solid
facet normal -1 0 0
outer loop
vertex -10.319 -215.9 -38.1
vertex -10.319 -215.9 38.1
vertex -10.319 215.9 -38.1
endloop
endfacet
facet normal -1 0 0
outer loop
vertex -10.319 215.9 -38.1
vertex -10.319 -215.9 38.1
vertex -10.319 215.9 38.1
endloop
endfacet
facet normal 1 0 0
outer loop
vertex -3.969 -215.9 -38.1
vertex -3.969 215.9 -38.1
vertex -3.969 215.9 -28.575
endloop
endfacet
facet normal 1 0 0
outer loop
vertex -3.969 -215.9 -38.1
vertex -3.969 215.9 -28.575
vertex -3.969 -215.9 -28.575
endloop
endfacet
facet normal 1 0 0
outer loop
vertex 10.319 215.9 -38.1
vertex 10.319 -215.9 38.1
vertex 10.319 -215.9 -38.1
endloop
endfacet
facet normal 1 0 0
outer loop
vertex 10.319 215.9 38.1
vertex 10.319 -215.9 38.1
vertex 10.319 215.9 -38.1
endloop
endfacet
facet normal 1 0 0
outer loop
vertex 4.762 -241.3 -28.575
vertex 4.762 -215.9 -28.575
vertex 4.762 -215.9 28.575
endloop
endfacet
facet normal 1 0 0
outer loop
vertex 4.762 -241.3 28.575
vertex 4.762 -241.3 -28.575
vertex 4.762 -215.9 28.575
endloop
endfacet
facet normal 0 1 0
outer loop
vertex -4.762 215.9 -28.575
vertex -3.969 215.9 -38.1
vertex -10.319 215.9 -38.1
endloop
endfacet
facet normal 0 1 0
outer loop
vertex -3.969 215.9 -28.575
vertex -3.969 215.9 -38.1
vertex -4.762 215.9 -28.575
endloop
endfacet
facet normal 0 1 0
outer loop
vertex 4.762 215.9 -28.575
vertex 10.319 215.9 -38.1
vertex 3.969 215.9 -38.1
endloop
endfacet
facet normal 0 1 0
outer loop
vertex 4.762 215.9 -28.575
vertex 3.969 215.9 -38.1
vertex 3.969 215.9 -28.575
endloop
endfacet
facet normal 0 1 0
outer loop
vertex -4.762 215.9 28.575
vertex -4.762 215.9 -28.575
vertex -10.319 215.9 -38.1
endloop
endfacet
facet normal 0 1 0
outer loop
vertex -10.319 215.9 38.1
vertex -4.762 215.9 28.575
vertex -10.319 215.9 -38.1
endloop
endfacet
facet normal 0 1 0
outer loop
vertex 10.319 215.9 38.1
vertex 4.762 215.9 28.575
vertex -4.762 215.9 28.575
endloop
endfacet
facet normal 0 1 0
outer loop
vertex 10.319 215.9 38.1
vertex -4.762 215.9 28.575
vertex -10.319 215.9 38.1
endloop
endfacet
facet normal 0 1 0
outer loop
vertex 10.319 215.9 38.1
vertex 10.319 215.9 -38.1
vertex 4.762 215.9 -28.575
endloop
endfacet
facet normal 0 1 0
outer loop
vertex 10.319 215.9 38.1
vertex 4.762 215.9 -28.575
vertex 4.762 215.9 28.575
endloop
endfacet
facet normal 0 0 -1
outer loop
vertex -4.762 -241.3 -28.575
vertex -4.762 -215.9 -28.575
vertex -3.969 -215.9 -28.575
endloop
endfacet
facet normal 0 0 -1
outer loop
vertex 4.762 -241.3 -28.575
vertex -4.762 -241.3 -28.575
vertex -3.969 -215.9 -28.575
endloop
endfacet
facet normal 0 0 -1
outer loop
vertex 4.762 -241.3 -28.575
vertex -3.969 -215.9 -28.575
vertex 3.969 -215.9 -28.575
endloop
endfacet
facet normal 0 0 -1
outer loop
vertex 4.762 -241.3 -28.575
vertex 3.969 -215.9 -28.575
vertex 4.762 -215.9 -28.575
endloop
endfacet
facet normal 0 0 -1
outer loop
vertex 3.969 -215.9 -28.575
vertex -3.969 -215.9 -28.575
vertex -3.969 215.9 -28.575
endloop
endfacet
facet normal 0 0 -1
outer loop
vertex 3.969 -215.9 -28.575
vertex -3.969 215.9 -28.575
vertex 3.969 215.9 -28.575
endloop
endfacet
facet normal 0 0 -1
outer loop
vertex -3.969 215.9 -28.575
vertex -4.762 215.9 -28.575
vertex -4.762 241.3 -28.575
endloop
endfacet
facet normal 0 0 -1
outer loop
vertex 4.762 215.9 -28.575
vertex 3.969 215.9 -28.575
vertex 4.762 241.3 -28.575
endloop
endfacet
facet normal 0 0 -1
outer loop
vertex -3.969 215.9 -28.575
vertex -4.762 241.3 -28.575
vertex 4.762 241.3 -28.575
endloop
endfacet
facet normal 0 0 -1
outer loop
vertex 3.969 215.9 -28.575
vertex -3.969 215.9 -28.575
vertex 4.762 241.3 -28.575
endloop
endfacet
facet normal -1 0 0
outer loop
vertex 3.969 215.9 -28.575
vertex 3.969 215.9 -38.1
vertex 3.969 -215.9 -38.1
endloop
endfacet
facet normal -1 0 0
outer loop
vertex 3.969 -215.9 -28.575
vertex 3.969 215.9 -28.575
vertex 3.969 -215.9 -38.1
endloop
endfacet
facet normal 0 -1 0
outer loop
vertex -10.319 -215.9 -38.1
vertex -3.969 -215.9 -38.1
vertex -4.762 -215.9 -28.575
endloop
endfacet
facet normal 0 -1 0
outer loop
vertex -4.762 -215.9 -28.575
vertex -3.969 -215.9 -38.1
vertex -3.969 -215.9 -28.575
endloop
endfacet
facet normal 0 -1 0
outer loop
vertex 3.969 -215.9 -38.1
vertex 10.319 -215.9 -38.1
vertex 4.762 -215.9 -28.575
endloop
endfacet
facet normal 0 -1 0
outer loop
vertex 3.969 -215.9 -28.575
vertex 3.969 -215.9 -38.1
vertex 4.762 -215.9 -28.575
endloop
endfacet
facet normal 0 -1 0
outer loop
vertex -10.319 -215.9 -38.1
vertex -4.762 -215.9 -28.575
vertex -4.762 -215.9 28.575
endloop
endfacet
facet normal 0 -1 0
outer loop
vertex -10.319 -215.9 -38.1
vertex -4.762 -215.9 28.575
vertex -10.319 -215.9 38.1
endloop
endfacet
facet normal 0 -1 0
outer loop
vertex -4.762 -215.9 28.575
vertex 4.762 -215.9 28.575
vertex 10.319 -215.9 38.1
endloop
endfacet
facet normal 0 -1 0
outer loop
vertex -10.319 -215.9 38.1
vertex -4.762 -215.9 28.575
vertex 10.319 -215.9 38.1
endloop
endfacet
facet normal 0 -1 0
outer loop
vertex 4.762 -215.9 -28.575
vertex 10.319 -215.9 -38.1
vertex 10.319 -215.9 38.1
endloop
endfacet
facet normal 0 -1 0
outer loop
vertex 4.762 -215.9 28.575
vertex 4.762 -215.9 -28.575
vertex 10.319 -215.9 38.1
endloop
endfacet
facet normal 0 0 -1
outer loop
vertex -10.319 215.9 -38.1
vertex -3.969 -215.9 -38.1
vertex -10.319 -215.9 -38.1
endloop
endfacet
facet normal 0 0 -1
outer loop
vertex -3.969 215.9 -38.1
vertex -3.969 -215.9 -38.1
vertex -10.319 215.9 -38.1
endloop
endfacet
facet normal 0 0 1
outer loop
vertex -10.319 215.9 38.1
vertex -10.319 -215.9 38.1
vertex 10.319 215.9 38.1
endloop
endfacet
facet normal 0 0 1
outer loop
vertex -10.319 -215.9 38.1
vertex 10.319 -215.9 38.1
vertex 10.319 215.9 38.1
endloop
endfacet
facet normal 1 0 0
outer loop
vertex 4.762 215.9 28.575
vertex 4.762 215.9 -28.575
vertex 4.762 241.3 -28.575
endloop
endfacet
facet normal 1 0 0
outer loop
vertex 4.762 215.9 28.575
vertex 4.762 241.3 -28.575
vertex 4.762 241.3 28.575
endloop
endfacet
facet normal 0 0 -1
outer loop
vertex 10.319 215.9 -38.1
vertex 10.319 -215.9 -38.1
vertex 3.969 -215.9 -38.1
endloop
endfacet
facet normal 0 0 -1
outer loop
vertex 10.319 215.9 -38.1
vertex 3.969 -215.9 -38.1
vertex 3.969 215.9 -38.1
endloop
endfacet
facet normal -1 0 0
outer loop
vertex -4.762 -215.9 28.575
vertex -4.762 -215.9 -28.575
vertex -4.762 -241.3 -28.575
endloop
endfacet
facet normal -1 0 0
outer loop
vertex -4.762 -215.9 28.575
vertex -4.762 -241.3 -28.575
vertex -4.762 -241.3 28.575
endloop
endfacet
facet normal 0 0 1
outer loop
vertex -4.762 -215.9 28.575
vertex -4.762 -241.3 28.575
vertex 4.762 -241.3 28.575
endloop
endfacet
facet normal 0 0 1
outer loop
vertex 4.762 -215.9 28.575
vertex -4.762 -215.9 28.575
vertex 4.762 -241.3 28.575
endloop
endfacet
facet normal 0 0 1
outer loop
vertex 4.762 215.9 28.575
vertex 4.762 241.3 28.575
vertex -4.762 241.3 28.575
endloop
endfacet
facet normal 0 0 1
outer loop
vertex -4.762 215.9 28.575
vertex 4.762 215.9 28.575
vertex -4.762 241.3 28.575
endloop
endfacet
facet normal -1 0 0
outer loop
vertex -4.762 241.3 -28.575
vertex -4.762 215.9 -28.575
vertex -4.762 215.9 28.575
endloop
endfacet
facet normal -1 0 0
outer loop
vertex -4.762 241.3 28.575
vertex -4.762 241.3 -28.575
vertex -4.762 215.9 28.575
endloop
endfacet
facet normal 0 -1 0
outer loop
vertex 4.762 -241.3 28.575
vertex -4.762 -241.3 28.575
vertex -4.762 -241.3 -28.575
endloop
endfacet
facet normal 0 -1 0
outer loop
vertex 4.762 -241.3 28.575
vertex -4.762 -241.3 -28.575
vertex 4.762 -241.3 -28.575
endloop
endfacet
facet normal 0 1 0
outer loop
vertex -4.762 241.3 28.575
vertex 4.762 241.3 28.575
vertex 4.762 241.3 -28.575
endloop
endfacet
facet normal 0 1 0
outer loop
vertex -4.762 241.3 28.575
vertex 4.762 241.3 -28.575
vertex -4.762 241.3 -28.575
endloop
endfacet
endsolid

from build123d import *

# Parameters (mm, degrees)
F0_W     = 431.8
F0_H     = 76.2
F1_DEPTH = 10.31875
F2_W     = 9.525
F2_H     = 57.15
F3_DEPTH = 25.4
F4_W     = 9.525
F4_H     = 57.15
F5_DEPTH = 25.4
F6_W     = 7.9375
F6_H     = 431.8
F7_DEPTH = 9.525


with BuildPart() as f1:
    # F0 (on Right) → F1 (new body, symmetric)
    with BuildSketch(Plane.YZ):
        Rectangle(F0_W, F0_H)
    extrude(amount=F1_DEPTH, both=True)

    # F2 (on face) → F3 (join)
    with BuildSketch(Plane.XZ.offset(215.9)):
        Rectangle(F2_W, F2_H)
    extrude(amount=F3_DEPTH)

    # F4 (on face) → F5 (join)
    with BuildSketch(Plane(origin=(0, 215.9, 0), x_dir=(-1, 0, 0), z_dir=(0, 1, 0))):
        Rectangle(F4_W, F4_H)
    extrude(amount=F5_DEPTH)

    # F6 (on face) → F7 (cut)
    with BuildSketch(Plane(origin=(0, 0, -38.1), x_dir=(1, 0, 0), z_dir=(0, 0, -1))):
        Rectangle(F6_W, F6_H)
    extrude(amount=-F7_DEPTH, mode=Mode.SUBTRACT)


solid = f1.part
